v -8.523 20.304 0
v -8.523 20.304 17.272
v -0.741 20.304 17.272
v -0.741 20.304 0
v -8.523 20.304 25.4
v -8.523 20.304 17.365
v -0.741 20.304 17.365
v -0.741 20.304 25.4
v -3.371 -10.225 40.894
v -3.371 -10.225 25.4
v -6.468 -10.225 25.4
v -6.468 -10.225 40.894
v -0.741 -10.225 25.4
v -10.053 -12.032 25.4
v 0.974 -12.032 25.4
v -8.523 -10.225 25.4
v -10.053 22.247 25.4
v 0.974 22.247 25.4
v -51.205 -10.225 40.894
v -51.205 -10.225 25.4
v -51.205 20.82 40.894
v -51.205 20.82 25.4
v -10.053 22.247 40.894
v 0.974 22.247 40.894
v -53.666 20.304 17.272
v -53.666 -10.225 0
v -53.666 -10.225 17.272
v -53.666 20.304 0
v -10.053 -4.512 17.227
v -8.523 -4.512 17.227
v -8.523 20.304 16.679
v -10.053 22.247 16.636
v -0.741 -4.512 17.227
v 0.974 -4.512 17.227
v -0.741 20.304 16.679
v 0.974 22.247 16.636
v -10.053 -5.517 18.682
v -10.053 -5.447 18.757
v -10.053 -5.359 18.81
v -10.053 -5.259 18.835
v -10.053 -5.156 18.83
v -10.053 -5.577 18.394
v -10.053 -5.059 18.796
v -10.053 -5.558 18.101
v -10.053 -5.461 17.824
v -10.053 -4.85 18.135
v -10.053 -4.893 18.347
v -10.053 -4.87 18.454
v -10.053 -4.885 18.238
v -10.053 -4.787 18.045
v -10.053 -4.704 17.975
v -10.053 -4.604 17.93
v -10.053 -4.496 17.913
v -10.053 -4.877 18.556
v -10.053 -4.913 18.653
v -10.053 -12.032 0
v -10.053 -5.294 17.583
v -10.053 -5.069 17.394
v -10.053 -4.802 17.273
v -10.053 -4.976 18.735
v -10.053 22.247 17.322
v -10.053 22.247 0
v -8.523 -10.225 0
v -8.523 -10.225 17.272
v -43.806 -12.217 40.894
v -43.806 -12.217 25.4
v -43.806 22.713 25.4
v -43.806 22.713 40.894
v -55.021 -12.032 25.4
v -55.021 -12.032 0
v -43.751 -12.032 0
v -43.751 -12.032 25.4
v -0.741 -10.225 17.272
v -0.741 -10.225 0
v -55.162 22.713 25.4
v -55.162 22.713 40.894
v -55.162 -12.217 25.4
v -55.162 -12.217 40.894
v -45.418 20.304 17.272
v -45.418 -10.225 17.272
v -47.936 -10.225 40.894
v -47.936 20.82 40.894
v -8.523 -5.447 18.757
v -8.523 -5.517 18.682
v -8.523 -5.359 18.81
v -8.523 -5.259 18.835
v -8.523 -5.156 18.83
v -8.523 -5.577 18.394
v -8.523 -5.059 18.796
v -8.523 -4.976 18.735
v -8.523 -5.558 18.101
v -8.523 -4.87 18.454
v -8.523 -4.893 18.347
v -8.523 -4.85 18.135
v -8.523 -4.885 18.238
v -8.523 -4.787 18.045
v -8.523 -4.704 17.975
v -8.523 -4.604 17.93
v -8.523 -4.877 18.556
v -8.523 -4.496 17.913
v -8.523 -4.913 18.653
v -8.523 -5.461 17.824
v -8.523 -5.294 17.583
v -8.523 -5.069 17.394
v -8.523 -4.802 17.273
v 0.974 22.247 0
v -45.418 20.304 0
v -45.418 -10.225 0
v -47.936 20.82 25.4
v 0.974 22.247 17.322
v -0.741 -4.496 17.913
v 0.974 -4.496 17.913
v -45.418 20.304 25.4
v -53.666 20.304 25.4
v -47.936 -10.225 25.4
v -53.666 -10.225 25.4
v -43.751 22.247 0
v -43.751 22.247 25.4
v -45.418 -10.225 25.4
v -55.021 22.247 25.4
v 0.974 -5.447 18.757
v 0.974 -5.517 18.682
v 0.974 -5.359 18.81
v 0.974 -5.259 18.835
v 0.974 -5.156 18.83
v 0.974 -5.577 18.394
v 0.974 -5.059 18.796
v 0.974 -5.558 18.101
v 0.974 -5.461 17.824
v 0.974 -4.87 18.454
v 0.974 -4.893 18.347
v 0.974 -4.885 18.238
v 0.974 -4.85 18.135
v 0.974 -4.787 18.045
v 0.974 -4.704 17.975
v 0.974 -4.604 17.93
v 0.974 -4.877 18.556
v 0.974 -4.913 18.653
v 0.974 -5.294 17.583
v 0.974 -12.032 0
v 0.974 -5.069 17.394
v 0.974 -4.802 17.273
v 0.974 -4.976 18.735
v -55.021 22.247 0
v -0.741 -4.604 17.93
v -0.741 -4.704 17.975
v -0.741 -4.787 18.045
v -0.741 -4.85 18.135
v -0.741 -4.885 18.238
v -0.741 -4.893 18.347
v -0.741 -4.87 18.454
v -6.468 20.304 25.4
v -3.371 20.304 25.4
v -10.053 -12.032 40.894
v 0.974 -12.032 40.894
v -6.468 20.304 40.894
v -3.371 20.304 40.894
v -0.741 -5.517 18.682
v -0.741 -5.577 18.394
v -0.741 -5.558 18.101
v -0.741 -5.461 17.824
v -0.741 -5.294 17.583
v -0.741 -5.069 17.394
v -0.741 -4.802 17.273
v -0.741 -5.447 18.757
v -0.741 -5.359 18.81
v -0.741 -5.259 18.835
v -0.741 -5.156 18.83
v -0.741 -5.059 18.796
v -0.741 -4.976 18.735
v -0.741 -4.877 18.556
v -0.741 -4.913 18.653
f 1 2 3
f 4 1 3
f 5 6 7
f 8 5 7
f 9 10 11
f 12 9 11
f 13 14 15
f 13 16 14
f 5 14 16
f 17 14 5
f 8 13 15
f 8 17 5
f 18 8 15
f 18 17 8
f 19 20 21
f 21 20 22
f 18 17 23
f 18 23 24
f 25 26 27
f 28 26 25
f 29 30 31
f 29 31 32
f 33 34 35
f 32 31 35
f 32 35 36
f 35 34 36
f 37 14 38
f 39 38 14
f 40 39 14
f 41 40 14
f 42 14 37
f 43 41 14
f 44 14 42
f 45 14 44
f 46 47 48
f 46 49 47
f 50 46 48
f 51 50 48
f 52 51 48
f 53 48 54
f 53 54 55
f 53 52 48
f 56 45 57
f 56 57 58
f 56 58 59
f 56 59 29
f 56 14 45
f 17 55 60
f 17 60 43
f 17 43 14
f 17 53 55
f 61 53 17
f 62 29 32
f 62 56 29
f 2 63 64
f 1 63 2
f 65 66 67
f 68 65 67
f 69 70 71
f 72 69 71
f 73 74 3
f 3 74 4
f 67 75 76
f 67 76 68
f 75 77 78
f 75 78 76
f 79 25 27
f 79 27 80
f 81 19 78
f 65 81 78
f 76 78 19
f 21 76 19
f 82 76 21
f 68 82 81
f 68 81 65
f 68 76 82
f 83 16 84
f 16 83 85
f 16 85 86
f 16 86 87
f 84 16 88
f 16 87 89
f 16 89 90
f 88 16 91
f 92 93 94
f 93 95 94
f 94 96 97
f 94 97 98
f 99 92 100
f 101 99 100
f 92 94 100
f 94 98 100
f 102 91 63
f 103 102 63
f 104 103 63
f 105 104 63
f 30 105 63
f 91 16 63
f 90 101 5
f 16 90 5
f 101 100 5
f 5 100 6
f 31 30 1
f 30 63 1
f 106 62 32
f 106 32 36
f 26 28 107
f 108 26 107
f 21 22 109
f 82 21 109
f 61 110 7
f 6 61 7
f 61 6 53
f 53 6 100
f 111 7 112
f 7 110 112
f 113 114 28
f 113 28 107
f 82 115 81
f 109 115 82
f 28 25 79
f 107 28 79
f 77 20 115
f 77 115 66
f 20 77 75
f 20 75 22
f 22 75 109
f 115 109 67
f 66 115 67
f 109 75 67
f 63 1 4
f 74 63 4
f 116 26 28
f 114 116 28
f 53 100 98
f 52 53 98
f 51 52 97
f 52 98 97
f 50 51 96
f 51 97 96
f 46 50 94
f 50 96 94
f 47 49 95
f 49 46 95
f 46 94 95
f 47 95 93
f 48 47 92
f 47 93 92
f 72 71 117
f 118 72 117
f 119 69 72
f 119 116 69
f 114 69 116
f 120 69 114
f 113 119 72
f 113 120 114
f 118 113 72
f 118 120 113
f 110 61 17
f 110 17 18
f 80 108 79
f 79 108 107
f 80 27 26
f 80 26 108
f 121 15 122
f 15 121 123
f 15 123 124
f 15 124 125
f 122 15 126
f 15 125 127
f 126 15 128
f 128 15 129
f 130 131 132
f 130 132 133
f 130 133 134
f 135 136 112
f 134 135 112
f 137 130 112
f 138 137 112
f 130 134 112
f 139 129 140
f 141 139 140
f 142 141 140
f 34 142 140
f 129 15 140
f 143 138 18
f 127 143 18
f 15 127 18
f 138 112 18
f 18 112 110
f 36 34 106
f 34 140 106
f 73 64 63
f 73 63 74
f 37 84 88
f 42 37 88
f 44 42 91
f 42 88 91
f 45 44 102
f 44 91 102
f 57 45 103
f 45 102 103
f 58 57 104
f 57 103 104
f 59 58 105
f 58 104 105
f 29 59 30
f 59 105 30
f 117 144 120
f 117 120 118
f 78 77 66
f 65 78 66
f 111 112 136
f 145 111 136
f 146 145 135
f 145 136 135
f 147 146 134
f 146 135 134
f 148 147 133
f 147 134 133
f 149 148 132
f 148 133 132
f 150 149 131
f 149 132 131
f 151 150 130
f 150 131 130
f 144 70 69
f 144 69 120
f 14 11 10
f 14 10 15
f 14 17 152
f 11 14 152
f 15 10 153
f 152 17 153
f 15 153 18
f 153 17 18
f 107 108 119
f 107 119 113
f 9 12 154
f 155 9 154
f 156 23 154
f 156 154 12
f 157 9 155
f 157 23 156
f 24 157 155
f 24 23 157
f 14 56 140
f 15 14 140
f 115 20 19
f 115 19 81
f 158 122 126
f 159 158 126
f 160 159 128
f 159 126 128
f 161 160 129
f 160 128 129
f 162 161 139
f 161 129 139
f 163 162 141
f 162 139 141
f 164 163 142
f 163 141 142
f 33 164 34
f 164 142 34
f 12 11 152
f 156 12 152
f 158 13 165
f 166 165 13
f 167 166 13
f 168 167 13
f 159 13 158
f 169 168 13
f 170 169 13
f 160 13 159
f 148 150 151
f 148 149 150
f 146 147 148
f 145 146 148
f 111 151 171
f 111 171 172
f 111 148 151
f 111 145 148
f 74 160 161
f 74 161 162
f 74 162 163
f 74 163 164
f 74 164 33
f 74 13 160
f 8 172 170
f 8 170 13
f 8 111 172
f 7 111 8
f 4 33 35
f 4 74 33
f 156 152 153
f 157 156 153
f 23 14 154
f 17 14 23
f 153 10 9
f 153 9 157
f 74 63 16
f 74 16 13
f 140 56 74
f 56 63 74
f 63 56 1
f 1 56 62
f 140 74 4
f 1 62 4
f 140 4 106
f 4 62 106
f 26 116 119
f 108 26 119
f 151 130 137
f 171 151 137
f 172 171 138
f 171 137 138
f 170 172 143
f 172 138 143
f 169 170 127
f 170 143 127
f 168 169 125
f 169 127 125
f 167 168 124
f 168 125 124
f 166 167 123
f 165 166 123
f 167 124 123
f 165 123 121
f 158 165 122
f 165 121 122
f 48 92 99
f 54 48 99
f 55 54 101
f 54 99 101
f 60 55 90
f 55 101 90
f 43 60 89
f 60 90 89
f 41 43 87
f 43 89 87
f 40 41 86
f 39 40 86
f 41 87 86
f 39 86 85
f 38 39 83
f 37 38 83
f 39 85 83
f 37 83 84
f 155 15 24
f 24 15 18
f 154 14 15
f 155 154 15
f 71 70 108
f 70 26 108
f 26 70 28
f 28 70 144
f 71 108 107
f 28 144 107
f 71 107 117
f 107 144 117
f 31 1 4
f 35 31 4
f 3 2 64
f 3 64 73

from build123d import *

# Parameters (mm, degrees)
F0_W     = 11.2702250481
F0_H     = 34.278973937
F0_W_2   = 8.2472413778
F0_H_2   = 30.5292597041
F1_DEPTH = 25.4
F0_W_3   = 11.0276525375
F0_W_4   = 7.7818950522
F2_DEPTH = 17.272
F3_W     = 11.0276525375
F3_H     = 34.278973937
F3_W_2   = 2.629864437
F3_H_2   = 30.5292597041
F3_W_3   = 2.0548701286
F4_DEPTH = 15.494
F3_W_4   = 11.3562569022
F3_H_3   = 34.9290966988
F3_W_5   = 3.269225359
F3_H_4   = 31.0449050739
F6_DEPTH = 59.182


with BuildPart() as f1:
    # F0 (on Top) → F1 (new body)
    with BuildSketch(Plane.XY):
        with Locations((-49.3858940899, 5.1079085097)):
            Rectangle(F0_W, F0_H)
        with Locations((-49.5420247316, 5.0395322032)):
            Rectangle(F0_W_2, F0_H_2, mode=Mode.SUBTRACT)
    extrude(amount=F1_DEPTH)


with BuildPart() as f1b:
    # F0 (on Top) → F1, piece 2 (new body)
    with BuildSketch(Plane.XY):
        with Locations((-4.5396565692, 5.1079085097)):
            Rectangle(F0_W_3, F0_H)
        with Locations((-4.6319066605, 5.0395322032)):
            Rectangle(F0_W_4, F0_H_2, mode=Mode.SUBTRACT)
    extrude(amount=F1_DEPTH)

    # F5 (on face) → F6 (cut)
    with BuildSketch(Plane.YZ.offset(0.9741696995)):
        with BuildLine():
            Line((-4.5115595148, 17.2269957008), (22.2473954782, 16.6359301656))
            Line((22.2473954782, 16.6359301656), (22.2473954782, 17.3218974883))
            Line((22.2473954782, 17.3218974883), (-4.4964149055, 17.9126285015))
            ThreePointArc((-4.4964149055, 17.9126285015), (-4.8215182289, 18.0877108855), (-4.870465867, 18.453702881))
            ThreePointArc((-4.870465867, 18.453702881), (-5.106187809, 18.8163662832), (-5.5172423918, 18.6817419644))
            ThreePointArc((-5.5172423918, 18.6817419644), (-5.3856405338, 17.6977266272), (-4.5115595148, 17.2269957008))
        make_face()
    extrude(amount=-F6_DEPTH, mode=Mode.SUBTRACT)


with BuildPart() as f2:
    # F0 (on Top) → F2 (new body)
    with BuildSketch(Plane.XY):
        with Locations((-4.6319066605, 5.0395322032)):
            Rectangle(F0_W_4, F0_H_2)
    extrude(amount=F2_DEPTH)


with BuildPart() as f2b:
    # F0 (on Top) → F2, piece 2 (new body)
    with BuildSketch(Plane.XY):
        with Locations((-49.5420247316, 5.0395322032)):
            Rectangle(F0_W_2, F0_H_2)
    extrude(amount=F2_DEPTH)


with BuildPart() as f4:
    # F3 (on face) → F4 (new body)
    with BuildSketch(Plane.XY.offset(25.4)):
        with Locations((-4.5396565692, 5.1079085097)):
            Rectangle(F3_W, F3_H)
        Polygon((-8.5228541866, 20.3041620553), (-6.467984058, 20.3041620553), (-3.3708235715, 20.3041620553), (-0.7409591344, 20.3041620553), (-0.7409591344, -10.2250976488), (-3.3708235715, -10.2250976488), (-6.467984058, -10.2250976488), (-8.5228541866, -10.2250976488), align=None, mode=Mode.SUBTRACT)
        with Locations((-2.0558913529, 5.0395322032)):
            Rectangle(F3_W_2, F3_H_2)
        with Locations((-7.4954191223, 5.0395322032)):
            Rectangle(F3_W_3, F3_H_2)
    extrude(amount=F4_DEPTH)


with BuildPart() as f4b:
    # F3 (on face) → F4, piece 2 (new body)
    with BuildSketch(Plane.XY.offset(25.4)):
        with Locations((-49.4841150939, 5.2479691803)):
            Rectangle(F3_W_4, F3_H_3)
        with Locations((-49.5701469481, 5.2973548882)):
            Rectangle(F3_W_5, F3_H_4, mode=Mode.SUBTRACT)
    extrude(amount=F4_DEPTH)


solid = Compound([f1.part, f1b.part, f2.part, f2b.part, f4.part, f4b.part])
